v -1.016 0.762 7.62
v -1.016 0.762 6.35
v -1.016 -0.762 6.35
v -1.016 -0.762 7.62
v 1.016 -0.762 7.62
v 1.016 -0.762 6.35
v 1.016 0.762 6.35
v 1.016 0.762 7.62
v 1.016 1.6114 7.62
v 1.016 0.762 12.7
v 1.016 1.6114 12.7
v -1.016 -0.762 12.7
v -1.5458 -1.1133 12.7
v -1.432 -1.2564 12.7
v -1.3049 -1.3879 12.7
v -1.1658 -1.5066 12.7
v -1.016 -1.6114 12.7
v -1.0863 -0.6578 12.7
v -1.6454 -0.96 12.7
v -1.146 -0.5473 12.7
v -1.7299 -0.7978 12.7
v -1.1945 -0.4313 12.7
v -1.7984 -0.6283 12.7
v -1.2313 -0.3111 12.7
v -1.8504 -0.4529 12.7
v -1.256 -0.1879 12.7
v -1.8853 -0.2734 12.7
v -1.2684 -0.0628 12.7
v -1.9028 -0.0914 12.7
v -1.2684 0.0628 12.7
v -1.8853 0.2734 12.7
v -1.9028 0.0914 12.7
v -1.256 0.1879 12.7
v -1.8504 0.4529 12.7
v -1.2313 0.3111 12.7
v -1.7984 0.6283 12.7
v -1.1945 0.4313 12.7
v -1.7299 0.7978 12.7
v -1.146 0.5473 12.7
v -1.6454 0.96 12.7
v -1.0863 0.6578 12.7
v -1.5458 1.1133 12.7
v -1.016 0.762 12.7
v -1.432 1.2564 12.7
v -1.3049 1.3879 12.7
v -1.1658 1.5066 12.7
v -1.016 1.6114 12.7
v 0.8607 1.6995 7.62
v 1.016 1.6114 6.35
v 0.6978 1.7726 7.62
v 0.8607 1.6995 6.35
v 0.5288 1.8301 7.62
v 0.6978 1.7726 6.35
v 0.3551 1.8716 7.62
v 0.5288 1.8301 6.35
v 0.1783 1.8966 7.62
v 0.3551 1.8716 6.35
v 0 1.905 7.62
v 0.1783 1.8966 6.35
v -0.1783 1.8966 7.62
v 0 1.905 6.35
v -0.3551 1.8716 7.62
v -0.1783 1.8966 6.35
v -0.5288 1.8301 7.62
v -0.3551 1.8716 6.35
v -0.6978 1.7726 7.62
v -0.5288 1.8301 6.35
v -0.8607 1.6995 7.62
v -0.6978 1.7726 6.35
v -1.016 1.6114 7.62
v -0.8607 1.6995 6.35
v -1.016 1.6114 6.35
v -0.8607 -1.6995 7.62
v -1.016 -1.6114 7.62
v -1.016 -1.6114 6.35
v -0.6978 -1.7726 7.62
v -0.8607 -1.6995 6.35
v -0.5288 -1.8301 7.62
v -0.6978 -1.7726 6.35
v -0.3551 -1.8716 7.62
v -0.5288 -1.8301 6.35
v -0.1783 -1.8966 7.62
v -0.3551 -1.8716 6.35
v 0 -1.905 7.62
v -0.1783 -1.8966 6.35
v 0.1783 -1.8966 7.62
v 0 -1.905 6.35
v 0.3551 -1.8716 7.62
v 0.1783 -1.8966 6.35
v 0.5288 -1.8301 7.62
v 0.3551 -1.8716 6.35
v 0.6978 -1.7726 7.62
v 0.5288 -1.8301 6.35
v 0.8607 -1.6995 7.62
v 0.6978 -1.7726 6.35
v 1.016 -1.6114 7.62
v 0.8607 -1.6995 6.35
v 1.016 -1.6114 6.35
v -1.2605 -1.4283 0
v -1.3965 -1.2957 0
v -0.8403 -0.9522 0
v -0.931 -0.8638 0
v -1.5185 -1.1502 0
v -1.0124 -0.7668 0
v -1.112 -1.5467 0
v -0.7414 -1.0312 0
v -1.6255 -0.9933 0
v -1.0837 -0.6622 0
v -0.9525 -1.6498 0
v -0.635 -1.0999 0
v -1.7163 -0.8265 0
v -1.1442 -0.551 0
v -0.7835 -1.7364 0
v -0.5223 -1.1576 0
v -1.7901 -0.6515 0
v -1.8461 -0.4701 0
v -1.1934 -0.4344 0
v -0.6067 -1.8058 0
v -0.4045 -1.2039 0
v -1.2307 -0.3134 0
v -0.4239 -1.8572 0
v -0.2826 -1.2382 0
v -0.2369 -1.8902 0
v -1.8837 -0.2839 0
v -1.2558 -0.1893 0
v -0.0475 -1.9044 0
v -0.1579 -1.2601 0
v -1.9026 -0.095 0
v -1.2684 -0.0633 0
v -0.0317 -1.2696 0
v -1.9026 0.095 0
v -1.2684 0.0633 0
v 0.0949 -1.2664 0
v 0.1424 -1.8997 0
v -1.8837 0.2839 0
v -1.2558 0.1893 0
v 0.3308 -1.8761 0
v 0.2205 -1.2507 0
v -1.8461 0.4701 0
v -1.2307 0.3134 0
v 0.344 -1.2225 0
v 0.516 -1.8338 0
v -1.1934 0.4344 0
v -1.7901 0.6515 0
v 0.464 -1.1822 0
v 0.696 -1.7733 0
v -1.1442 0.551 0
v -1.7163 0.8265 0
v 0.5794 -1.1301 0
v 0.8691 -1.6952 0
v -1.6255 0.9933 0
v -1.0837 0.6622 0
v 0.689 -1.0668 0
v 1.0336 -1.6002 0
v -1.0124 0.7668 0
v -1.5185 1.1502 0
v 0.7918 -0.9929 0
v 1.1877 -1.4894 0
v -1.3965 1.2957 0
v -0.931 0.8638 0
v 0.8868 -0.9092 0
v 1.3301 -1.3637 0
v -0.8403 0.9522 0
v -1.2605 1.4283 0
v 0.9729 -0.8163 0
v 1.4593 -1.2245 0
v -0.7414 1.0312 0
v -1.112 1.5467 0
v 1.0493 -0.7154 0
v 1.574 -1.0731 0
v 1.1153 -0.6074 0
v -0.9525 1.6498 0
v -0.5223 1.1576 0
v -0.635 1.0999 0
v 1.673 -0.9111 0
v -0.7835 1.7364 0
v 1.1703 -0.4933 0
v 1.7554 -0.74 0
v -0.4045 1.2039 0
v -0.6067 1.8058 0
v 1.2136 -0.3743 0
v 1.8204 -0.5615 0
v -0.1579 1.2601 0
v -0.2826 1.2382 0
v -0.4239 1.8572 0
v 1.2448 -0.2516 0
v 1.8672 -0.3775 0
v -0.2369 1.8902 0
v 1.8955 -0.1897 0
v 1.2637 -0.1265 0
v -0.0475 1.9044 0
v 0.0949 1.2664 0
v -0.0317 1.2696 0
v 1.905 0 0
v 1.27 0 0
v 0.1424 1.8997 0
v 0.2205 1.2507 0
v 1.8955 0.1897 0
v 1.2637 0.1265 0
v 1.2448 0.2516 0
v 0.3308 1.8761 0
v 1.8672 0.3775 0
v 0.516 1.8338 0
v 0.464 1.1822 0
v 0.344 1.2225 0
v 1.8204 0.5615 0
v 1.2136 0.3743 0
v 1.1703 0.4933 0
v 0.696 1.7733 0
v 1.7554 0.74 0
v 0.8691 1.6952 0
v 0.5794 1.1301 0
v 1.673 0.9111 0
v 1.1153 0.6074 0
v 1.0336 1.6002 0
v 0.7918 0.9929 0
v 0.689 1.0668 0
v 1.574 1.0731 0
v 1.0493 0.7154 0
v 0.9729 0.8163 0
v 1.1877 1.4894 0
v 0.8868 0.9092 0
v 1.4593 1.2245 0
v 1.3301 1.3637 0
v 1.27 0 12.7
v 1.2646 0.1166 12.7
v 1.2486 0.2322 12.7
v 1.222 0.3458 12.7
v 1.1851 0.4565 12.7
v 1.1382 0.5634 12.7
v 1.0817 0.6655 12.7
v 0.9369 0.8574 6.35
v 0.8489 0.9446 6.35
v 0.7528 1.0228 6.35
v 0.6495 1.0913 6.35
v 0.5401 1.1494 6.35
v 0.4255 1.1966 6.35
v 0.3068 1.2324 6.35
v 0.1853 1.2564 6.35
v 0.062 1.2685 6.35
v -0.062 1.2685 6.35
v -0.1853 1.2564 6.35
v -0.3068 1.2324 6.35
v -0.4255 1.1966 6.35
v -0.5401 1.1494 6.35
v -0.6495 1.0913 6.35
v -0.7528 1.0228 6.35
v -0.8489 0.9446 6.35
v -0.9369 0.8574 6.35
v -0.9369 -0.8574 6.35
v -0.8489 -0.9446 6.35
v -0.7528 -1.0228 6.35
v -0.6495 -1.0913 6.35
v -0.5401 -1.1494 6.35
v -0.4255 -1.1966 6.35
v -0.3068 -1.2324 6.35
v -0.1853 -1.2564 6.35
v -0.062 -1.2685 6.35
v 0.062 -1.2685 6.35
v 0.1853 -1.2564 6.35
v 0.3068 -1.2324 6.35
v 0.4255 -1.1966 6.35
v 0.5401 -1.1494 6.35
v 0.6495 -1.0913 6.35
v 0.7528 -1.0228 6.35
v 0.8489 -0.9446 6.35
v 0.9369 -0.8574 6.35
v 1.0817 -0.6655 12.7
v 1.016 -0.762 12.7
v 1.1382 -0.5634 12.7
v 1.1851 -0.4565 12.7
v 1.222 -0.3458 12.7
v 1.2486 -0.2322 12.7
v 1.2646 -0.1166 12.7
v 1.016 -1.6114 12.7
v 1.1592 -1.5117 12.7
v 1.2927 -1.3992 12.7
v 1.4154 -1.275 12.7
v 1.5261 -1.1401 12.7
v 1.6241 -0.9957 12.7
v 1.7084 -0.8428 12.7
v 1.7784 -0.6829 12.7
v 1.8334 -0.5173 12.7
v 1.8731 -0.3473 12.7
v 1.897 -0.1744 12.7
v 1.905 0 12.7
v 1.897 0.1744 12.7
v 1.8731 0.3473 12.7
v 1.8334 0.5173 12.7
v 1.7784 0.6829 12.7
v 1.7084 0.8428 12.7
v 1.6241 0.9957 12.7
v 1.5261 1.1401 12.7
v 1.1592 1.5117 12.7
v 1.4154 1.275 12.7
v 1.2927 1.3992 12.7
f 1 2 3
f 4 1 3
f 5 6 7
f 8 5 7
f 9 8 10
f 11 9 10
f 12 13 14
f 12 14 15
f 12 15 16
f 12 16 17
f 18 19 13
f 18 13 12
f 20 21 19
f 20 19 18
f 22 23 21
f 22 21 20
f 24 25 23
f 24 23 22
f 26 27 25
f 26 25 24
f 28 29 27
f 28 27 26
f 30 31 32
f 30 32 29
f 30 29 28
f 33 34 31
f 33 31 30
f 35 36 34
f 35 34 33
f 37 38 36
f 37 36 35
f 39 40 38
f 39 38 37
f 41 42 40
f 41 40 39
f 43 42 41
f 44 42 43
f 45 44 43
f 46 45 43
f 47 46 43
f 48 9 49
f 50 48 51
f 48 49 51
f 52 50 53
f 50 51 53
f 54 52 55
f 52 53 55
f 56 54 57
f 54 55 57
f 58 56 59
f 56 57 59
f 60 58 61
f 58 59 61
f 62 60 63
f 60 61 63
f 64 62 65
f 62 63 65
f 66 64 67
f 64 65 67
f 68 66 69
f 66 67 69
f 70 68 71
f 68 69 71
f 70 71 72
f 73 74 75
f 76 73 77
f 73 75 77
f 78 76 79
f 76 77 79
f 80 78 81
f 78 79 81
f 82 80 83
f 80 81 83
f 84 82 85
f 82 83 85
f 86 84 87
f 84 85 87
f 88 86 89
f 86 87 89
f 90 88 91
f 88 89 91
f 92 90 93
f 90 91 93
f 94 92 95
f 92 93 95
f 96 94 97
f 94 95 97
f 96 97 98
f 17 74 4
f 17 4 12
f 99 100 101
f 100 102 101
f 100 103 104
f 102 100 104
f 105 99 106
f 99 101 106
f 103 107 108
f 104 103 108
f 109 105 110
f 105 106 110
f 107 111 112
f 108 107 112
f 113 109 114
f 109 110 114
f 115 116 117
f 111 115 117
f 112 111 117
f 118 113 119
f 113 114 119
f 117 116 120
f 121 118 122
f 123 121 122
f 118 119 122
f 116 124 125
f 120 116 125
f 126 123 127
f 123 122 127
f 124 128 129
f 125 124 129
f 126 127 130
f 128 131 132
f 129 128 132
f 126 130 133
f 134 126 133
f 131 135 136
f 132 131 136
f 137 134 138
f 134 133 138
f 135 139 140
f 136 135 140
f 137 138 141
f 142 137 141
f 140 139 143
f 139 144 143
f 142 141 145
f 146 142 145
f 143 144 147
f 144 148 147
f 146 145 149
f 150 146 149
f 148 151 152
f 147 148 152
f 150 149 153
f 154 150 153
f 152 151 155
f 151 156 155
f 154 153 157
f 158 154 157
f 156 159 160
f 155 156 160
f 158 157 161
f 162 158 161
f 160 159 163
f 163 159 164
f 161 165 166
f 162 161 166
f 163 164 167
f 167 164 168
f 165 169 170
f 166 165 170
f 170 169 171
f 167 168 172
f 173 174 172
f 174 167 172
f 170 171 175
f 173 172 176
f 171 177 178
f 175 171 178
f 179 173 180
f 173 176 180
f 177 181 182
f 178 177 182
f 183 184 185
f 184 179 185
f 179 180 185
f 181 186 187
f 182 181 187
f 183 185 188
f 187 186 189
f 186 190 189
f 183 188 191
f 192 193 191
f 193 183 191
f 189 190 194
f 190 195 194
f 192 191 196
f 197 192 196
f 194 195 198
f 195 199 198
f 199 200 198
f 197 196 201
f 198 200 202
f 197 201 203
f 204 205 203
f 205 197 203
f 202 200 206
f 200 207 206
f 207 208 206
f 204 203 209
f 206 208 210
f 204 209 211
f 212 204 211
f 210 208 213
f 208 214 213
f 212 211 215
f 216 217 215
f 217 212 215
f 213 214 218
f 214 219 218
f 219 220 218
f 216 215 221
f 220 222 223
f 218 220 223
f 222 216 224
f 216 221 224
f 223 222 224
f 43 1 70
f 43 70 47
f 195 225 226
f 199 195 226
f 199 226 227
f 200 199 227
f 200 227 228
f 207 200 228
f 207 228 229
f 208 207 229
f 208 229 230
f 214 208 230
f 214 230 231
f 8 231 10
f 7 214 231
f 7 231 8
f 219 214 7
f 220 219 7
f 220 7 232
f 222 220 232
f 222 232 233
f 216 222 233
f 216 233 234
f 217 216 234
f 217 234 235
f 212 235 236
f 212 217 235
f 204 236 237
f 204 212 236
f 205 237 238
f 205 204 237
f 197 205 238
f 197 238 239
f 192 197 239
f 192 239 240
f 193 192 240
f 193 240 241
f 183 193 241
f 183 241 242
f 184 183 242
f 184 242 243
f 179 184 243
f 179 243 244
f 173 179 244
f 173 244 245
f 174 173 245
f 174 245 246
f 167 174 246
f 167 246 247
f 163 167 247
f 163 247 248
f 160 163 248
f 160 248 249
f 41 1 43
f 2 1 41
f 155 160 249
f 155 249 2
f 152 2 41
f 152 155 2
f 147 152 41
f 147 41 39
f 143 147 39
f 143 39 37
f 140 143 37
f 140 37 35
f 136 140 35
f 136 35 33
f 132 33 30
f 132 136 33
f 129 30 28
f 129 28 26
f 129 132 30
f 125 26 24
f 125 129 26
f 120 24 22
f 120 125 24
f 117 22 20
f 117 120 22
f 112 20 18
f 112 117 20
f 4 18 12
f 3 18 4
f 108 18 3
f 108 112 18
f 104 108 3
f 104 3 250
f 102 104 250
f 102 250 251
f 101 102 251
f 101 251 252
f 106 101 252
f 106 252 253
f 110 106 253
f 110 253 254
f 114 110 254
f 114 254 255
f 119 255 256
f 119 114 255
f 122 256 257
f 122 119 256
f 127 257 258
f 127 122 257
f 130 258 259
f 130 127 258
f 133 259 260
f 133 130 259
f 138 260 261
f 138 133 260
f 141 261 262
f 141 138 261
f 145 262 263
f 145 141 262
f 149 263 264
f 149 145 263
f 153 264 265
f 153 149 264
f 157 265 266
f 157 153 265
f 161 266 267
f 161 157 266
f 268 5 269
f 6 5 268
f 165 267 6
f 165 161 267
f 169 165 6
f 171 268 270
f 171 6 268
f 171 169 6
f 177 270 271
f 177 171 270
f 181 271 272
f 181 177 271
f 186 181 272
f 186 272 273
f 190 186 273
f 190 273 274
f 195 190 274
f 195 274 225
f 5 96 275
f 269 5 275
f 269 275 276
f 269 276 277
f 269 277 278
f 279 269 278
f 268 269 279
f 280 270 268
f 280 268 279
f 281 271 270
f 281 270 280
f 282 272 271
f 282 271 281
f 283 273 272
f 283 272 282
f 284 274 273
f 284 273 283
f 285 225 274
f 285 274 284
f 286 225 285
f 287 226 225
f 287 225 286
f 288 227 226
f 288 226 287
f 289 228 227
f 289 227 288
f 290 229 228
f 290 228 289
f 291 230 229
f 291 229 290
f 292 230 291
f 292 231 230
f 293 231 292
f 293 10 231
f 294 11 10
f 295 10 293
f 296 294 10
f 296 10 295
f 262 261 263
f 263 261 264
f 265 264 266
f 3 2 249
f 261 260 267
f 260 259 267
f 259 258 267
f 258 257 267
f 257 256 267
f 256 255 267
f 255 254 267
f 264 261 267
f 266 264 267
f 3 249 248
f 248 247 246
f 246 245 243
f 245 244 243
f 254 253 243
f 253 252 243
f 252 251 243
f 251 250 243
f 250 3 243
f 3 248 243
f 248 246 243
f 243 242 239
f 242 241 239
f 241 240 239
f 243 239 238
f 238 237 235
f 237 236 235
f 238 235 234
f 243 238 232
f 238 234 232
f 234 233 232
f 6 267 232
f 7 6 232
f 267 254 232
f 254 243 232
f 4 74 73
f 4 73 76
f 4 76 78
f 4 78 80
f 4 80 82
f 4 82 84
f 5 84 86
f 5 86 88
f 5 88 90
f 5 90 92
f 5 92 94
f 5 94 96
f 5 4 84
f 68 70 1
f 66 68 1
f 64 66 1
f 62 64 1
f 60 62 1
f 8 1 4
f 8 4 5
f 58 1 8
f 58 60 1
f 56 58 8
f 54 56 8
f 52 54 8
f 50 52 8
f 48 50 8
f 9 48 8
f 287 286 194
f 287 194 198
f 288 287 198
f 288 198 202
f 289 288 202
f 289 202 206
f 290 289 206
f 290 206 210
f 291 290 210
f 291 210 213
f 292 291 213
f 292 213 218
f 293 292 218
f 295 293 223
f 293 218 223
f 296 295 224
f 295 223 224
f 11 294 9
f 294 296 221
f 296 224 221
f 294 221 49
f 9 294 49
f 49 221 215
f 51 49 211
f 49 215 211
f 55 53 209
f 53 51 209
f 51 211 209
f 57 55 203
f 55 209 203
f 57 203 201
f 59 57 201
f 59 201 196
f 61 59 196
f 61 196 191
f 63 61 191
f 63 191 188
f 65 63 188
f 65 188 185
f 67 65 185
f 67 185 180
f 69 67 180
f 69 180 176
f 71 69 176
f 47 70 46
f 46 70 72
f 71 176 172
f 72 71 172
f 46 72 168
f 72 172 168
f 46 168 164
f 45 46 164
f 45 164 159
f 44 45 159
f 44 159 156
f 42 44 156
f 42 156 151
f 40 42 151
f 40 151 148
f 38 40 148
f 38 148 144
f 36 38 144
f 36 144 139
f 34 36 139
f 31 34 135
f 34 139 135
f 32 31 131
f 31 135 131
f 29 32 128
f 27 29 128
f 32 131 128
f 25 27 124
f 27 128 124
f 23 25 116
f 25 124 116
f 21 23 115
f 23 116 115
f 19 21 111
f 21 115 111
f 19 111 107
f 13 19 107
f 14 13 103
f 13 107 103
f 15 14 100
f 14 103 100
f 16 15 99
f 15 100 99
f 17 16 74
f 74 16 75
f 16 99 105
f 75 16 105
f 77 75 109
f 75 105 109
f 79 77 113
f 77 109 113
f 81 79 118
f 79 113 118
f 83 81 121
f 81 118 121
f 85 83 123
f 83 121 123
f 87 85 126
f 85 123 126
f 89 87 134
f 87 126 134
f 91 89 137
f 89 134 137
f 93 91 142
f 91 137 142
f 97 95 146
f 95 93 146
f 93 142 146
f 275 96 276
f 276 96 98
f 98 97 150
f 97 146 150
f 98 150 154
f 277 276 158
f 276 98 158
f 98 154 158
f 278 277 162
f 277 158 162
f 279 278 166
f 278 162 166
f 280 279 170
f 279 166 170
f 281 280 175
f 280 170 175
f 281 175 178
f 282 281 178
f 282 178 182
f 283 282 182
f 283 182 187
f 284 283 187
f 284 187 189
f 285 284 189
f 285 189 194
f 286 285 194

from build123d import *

# Parameters (mm, degrees)
F0_R     = 1.905
F0_R_2   = 1.27
F1_DEPTH = 12.7
F2_W     = 2.032
F2_H     = 13.7110514179
F3_DEPTH = 12.7
F5_DEPTH = 1.27


with BuildPart() as f1:
    # F0 (on Top) → F1 (new body)
    with BuildSketch(Plane.XY):
        Circle(F0_R)
        Circle(F0_R_2, mode=Mode.SUBTRACT)
    extrude(amount=F1_DEPTH)

    # F2 (on Front) → F3 (cut, symmetric)
    with BuildSketch(Plane.XZ):
        with Locations((0, 13.2055257089)):
            Rectangle(F2_W, F2_H)
    extrude(amount=F3_DEPTH, both=True, mode=Mode.SUBTRACT)

    # F4 (on face) → F5 (join)
    with BuildSketch(Plane.XY.offset(6.35)):
        with BuildLine():
            Line((-1.016, 1.6114493476), (-1.016, -1.6114493476))
            ThreePointArc((-1.016, -1.6114493476), (0, -1.905), (1.016, -1.6114493476))
            Line((1.016, -1.6114493476), (1.016, 1.6114493476))
            ThreePointArc((1.016, 1.6114493476), (0, 1.905), (-1.016, 1.6114493476))
        make_face()
    extrude(amount=F5_DEPTH)


solid = f1.part
